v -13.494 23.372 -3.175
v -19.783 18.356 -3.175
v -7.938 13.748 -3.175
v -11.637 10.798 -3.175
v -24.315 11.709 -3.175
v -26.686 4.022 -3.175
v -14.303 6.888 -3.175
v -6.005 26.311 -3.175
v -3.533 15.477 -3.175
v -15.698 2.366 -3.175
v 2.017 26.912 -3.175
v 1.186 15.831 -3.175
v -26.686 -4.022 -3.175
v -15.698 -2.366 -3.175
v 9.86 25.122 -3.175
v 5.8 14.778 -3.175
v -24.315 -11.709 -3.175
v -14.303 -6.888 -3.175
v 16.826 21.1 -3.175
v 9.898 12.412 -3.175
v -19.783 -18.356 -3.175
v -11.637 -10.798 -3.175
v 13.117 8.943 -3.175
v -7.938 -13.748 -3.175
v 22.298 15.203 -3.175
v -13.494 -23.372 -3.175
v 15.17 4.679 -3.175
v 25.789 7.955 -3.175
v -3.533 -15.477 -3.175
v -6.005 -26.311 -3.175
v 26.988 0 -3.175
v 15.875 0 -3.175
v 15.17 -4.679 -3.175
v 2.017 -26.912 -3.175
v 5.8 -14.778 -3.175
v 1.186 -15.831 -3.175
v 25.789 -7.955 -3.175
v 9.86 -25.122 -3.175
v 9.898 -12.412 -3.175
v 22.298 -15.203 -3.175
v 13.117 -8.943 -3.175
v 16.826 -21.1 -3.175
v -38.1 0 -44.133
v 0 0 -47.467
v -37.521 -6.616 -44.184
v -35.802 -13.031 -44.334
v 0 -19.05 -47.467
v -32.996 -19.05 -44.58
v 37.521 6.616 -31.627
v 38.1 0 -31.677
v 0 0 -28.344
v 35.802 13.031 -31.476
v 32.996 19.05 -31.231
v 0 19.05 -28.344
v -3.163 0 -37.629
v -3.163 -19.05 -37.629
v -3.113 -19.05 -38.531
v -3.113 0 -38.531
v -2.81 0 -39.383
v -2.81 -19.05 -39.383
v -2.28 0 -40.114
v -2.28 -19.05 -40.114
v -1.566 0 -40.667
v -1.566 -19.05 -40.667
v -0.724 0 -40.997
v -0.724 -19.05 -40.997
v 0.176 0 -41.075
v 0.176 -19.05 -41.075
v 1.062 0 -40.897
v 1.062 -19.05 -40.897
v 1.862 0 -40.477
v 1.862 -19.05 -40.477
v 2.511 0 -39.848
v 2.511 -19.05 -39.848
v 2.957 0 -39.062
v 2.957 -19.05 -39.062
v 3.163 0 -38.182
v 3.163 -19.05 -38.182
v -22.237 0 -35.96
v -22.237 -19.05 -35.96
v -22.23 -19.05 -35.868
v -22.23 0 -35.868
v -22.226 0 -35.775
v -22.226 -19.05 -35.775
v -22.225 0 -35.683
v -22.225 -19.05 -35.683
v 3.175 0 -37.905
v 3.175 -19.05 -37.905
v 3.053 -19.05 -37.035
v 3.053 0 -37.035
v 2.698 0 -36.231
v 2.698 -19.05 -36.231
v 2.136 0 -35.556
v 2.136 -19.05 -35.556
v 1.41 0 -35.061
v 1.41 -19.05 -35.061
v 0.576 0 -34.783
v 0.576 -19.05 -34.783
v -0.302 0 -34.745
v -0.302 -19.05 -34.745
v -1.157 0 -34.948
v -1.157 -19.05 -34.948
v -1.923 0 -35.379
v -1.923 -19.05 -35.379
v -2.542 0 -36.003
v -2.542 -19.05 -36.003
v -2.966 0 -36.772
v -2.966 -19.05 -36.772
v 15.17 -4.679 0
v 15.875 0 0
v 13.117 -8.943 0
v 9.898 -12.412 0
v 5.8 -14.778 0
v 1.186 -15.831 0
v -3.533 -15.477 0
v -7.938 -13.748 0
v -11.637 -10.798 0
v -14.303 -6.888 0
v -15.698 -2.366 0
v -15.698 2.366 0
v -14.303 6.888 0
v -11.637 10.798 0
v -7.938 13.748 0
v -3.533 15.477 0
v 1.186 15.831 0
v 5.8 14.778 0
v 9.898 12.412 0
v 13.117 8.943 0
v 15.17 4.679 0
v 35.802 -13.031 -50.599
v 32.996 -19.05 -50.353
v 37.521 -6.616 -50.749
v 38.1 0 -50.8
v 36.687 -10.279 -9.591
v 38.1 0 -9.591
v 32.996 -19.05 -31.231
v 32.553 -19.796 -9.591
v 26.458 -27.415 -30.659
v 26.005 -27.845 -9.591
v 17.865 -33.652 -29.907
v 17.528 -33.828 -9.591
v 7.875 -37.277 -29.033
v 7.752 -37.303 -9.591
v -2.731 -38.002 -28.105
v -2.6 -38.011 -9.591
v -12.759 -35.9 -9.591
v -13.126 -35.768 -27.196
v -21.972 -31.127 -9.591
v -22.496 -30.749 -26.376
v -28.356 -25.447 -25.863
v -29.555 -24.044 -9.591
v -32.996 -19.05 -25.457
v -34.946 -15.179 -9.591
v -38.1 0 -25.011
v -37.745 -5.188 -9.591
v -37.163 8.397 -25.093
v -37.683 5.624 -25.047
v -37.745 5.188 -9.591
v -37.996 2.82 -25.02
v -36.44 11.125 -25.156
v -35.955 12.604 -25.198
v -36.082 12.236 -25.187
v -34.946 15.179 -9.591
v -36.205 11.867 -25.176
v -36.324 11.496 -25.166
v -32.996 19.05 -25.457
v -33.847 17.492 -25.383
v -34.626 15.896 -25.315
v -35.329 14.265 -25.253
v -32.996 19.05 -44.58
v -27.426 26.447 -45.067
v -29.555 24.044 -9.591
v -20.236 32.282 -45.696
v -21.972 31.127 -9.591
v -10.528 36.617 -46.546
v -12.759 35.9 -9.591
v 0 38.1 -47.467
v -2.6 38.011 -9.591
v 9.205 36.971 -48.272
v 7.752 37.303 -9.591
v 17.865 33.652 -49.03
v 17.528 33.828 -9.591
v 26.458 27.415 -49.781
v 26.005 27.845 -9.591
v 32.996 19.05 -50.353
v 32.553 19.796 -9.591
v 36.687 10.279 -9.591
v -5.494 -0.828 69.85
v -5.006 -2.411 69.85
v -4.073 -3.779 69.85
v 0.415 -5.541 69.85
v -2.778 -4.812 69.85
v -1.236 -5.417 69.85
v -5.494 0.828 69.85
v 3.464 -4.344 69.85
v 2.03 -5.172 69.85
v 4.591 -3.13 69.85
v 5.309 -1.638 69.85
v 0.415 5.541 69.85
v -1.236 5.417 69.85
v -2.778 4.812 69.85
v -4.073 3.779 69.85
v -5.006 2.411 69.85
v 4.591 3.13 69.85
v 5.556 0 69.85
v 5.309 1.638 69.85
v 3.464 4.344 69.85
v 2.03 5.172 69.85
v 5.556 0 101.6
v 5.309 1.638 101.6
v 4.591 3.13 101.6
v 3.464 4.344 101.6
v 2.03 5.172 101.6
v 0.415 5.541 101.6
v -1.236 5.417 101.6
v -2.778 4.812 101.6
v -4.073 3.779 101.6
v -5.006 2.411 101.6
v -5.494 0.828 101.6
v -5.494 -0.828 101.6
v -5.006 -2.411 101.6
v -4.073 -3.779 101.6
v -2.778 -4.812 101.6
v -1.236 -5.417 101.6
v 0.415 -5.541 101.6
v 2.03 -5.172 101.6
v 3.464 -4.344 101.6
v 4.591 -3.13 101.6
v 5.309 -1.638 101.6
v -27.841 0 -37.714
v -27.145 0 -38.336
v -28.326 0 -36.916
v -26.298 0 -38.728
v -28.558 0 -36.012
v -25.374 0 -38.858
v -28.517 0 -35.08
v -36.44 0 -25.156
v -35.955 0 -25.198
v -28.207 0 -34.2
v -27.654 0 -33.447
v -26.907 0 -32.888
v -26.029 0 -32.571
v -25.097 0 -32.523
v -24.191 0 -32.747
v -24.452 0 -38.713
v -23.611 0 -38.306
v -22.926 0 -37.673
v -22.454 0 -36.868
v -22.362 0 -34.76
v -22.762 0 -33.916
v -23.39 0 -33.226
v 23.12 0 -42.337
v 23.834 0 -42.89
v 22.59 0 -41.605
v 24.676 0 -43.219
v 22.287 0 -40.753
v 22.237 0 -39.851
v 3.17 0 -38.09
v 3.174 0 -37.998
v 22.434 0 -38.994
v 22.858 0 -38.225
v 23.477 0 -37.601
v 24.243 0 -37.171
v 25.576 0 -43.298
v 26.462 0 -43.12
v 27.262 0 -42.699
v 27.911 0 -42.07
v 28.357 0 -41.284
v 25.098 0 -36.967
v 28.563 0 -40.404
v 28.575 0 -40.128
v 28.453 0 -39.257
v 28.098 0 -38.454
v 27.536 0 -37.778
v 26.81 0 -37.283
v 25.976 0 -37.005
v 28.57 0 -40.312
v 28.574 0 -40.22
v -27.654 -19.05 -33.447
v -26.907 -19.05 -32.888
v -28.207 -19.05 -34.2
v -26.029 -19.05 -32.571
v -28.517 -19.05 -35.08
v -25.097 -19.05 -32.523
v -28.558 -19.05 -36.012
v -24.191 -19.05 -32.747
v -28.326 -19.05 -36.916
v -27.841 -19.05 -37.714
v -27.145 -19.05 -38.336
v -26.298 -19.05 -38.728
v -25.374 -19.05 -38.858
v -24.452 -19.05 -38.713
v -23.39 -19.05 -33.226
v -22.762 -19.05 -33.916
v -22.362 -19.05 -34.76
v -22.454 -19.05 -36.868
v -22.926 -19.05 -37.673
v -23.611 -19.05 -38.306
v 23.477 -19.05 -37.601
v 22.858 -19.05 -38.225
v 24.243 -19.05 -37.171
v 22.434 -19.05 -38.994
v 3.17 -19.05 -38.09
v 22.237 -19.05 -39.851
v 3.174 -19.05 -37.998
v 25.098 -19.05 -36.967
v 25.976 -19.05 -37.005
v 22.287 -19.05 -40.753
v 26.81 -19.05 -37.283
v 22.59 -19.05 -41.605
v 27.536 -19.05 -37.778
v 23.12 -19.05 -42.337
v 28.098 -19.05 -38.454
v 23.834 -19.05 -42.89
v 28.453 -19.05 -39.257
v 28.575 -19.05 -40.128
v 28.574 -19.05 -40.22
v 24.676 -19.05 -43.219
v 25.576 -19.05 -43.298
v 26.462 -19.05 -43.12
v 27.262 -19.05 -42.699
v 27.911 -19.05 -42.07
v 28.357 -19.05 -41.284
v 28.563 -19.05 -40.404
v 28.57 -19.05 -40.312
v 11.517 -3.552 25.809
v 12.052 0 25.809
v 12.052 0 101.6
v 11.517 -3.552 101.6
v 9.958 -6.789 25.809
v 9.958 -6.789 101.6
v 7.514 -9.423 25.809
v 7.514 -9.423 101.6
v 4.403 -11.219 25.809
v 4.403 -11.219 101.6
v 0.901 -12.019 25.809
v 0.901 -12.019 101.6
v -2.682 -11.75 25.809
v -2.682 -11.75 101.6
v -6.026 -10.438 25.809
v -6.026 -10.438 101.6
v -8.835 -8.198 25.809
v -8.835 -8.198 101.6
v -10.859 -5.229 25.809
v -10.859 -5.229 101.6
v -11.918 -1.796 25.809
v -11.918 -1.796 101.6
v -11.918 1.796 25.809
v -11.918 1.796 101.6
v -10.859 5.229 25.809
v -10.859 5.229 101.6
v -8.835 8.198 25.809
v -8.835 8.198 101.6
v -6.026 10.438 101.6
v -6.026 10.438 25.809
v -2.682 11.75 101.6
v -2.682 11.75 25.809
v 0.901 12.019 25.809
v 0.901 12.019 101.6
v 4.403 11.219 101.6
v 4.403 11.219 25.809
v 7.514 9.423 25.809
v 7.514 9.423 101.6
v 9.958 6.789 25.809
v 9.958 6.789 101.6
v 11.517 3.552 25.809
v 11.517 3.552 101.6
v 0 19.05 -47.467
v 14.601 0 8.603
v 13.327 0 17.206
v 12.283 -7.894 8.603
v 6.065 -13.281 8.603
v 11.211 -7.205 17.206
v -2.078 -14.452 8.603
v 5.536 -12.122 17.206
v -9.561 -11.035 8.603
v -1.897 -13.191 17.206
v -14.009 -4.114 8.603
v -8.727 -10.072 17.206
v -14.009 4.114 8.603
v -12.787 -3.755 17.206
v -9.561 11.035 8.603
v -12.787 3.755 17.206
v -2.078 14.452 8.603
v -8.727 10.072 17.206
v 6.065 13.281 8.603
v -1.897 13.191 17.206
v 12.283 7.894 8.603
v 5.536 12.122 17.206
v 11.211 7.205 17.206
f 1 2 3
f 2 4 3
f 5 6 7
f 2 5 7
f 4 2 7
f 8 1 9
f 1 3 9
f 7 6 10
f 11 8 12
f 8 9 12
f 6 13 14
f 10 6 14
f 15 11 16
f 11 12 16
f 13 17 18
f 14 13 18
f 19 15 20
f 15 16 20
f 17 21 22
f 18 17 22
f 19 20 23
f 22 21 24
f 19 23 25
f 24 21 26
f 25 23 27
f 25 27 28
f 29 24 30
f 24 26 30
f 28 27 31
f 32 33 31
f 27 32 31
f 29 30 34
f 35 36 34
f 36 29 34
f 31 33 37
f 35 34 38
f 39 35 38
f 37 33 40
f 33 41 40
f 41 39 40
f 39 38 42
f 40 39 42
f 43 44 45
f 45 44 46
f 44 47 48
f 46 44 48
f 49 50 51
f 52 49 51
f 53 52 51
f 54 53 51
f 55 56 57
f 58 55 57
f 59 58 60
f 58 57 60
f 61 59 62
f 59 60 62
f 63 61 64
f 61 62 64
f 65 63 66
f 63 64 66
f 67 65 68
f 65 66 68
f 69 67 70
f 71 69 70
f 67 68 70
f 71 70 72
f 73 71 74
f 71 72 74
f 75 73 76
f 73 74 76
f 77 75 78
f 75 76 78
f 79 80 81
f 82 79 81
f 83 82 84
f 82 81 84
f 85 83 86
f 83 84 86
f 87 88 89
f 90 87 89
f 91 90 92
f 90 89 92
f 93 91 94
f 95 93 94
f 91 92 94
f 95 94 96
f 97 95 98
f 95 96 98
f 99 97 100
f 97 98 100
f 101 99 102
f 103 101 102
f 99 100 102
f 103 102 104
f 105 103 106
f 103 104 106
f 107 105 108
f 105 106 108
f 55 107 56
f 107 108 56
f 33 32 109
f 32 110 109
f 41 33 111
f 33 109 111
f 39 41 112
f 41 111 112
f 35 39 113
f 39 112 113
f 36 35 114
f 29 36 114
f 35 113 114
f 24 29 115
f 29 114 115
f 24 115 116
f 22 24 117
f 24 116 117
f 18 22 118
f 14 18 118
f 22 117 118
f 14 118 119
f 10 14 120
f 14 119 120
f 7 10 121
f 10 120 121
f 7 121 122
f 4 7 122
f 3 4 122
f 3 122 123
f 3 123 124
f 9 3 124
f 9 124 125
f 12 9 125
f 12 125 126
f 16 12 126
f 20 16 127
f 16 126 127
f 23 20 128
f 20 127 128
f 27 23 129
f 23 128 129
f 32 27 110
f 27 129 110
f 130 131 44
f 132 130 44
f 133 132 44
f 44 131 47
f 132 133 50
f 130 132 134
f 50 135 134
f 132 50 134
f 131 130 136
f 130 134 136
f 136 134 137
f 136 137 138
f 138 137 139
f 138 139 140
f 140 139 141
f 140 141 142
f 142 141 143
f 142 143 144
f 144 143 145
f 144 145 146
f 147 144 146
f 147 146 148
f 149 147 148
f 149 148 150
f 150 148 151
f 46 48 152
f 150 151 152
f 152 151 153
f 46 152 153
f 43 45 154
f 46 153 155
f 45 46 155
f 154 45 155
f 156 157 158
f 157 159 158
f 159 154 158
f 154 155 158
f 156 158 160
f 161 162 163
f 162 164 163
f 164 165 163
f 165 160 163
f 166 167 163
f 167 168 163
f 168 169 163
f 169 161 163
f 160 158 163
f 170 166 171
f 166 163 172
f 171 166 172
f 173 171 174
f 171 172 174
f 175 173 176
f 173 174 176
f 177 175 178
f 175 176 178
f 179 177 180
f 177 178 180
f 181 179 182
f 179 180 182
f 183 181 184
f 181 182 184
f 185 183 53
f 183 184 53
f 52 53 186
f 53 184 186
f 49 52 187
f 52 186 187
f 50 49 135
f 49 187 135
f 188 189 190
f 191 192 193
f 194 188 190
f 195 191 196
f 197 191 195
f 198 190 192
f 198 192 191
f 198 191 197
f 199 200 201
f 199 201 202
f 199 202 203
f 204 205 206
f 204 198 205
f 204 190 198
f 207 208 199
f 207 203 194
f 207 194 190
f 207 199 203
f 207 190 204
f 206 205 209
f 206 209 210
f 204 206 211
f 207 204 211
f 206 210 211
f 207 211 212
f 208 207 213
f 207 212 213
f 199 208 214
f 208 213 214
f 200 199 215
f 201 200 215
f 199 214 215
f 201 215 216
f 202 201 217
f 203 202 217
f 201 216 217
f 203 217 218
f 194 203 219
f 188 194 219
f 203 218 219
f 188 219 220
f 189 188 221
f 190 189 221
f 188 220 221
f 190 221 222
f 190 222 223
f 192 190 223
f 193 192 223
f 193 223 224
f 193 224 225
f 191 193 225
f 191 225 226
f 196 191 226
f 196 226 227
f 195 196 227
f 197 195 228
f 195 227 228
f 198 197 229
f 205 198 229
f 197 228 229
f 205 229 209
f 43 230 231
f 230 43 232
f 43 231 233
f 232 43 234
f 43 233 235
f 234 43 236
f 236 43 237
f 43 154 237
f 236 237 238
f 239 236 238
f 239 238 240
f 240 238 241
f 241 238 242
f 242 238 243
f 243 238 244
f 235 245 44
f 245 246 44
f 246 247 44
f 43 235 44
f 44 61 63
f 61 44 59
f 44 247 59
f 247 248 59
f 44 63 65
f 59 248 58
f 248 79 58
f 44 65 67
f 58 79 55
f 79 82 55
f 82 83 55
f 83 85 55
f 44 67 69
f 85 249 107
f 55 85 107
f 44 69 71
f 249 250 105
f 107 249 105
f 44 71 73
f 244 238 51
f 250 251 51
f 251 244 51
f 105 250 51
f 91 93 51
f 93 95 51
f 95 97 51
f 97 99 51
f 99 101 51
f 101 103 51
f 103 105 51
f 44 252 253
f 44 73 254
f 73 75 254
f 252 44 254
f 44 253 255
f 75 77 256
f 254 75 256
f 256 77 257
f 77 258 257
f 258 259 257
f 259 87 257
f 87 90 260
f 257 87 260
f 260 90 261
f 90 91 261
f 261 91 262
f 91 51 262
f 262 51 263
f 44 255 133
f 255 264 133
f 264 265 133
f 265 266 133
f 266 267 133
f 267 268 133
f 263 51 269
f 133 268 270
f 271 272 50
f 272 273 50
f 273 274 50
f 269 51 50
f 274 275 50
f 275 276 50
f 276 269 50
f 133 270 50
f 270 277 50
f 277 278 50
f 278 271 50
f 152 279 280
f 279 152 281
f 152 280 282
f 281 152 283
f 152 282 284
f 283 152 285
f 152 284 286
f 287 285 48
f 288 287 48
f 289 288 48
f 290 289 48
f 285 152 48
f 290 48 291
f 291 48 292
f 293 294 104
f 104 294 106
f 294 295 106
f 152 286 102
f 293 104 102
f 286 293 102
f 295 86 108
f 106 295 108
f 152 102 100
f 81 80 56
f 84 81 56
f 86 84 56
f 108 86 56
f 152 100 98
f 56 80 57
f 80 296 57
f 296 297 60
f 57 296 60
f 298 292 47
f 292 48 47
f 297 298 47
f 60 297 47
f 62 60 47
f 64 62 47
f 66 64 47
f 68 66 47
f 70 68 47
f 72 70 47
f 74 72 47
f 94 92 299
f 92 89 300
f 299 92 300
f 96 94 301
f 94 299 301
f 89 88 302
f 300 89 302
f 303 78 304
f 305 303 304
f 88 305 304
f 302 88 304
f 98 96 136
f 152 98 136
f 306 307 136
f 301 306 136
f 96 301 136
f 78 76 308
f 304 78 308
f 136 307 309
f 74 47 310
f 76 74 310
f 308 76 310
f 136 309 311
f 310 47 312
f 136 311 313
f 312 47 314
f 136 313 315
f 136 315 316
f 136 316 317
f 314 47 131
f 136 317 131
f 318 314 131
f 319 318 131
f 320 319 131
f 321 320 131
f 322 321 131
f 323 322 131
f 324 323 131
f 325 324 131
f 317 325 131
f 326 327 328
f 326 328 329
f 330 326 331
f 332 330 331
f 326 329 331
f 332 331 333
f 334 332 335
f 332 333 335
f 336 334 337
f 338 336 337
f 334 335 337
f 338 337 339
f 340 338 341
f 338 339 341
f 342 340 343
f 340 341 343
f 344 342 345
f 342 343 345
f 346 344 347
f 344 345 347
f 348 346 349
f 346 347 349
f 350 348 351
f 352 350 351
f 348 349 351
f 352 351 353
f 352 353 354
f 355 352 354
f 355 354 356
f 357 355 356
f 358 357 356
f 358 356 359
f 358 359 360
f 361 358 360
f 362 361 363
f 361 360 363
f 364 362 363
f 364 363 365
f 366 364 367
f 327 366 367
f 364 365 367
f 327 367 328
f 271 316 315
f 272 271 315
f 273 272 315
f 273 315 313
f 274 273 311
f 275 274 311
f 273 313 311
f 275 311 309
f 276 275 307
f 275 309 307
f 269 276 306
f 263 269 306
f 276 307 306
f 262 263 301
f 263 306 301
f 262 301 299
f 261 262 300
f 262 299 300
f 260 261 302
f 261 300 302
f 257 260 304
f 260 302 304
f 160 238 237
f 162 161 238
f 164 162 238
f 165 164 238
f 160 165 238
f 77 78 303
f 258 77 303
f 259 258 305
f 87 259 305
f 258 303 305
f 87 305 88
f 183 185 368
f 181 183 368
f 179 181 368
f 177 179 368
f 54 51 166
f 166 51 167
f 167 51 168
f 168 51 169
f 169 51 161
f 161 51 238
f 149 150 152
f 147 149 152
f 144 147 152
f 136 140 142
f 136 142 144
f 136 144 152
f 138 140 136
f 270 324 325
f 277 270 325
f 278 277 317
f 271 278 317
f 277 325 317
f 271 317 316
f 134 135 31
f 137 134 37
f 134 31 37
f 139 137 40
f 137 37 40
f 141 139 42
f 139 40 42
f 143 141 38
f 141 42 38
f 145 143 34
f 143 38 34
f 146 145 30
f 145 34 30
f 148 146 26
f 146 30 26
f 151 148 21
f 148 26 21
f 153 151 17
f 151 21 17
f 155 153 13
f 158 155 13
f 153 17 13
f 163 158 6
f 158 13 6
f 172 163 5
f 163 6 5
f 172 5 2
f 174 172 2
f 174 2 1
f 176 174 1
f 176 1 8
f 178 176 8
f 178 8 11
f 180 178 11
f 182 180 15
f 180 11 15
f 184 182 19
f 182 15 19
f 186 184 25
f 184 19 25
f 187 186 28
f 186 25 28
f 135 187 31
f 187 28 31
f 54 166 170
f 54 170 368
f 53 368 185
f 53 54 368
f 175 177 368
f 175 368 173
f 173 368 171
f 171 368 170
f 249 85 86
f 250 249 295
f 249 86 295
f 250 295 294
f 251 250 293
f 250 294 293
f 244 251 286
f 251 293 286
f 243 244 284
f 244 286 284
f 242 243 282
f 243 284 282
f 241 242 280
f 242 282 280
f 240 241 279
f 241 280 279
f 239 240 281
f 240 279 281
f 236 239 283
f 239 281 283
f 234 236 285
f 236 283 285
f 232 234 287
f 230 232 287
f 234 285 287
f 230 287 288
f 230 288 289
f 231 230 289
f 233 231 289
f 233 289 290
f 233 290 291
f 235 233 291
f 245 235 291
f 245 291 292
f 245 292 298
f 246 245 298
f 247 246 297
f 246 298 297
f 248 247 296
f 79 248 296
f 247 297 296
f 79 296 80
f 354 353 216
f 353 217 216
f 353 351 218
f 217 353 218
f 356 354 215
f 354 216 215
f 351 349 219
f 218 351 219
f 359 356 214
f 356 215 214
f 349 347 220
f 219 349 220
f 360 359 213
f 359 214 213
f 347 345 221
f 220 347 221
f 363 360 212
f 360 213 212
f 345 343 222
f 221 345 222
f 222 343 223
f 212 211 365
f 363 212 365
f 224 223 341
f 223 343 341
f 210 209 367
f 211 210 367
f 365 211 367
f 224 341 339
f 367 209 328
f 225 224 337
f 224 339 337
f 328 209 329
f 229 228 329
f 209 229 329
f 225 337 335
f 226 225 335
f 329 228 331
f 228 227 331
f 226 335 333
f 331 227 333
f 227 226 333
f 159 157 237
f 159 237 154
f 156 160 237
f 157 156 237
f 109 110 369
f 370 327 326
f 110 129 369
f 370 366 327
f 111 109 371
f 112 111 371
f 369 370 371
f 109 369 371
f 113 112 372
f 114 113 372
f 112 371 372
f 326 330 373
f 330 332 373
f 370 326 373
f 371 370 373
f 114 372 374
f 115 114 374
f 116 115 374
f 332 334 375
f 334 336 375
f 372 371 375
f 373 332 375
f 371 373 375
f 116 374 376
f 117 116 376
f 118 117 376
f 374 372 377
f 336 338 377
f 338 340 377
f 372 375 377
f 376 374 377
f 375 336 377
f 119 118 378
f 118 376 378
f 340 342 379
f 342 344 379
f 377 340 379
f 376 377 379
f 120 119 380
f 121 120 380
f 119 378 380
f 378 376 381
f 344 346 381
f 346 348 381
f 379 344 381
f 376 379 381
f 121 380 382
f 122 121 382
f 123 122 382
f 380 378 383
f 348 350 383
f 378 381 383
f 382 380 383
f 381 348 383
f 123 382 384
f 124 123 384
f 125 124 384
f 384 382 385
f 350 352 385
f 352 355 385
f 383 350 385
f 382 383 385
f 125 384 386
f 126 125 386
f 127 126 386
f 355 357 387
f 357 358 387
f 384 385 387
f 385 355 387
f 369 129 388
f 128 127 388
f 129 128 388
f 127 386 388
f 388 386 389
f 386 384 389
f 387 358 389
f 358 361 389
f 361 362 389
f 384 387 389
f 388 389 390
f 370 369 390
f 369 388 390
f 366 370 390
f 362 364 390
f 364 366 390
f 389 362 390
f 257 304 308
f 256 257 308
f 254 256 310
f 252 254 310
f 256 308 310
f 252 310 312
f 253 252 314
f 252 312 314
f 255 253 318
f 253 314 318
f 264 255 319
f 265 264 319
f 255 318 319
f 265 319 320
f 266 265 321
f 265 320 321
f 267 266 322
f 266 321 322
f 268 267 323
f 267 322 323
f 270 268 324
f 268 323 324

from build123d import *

# Parameters (mm, degrees)
F0_W     = 9.525
F0_H     = 50.8
F2_DEPTH = 38.1
F3_DEPTH = 19.05
F5_DEPTH = 19.05
F7_DEPTH = 19.05
F8_R     = 5.55625
F9_DEPTH = 31.75


with BuildPart() as f1:
    # F0 (on Front) → F1 (revolve)
    with BuildSketch(Plane.XZ):
        with Locations((4.7625, 25.4)):
            Rectangle(F0_W, F0_H)
        Polygon((0, 101.6), (0, 50.8), (9.525, 50.8), (9.525, 0), (15.875, 0), (12.0523, 25.8093433608), (12.0523, 101.6), align=None)
        Polygon((38.1, -31.4561230436), (0, -24.7380650786), (0, -28.3439140145), (38.1, -31.6772320948), align=None)
        Polygon((38.1, -31.6772320948), (0, -28.3439140145), (0, -44.081942035), (38.1, -50.8), align=None)
        Polygon((38.1, -50.8), (0, -44.081942035), (0, -47.4666819197), align=None)
        Polygon((38.1, -50.8), (0, -47.4666819197), (0, -50.8), align=None)
        Polygon((9.525, 0), (0, 0), (0, -24.7380650786), (38.1, -31.4561230436), (38.1, -9.5908048664), (26.9875, -3.175), (15.875, -3.175), (15.875, 0), align=None)
    revolve(axis=Axis((0, 0, -25.4), (0, 0, -1)))

    # F0 (on Front) → F2 (cut, symmetric)
    with BuildSketch(Plane.XZ):
        Polygon((0, -50.8), (0, -47.4666819197), (-38.1, -44.1333638393), (-38.1, -50.8), align=None)
        Polygon((38.1, -50.8), (0, -47.4666819197), (0, -50.8), align=None)
    extrude(amount=F2_DEPTH, both=True, mode=Mode.SUBTRACT)

    # F0 (on Front) → F3 (cut)
    with BuildSketch(Plane.XZ):
        Polygon((38.1, -31.6772320948), (0, -28.3439140145), (0, -44.081942035), (38.1, -50.8), align=None)
        Polygon((0, -44.081942035), (0, -28.3439140145), (-35.954874027, -25.1982701386), (-36.9244921743, -30.6972479093), (-37.5167449121, -37.4667276786), align=None)
        Polygon((0, -47.4666819197), (0, -44.081942035), (-37.5167449121, -37.4667276786), (-38.1, -44.1333638393), align=None)
        Polygon((38.1, -50.8), (0, -44.081942035), (0, -47.4666819197), align=None)
        Polygon((-36.9244921743, -30.6972479093), (-35.954874027, -25.1982701386), (-36.4396831007, -25.1558548407), align=None)
        Polygon((-38.1, -37.36388407), (-36.9244921743, -30.6972479093), (-36.4396831007, -25.1558548407), (-38.1, -25.0105959341), align=None)
        Polygon((-38.1, -37.36388407), (-37.5167449121, -37.4667276786), (-36.9244921743, -30.6972479093), align=None)
        Polygon((-38.1, -44.1333638393), (-37.5167449121, -37.4667276786), (-38.1, -37.36388407), align=None)
    extrude(amount=-F3_DEPTH, mode=Mode.SUBTRACT)

    # F4 (on face) → F5 (cut)
    with BuildSketch(Plane(origin=(-4.1212514076, 0, -47.106119142), x_dir=(0.9961946981, 0, -0.0871557427), z_dir=(-0.0871557427, 0, -0.9961946981))):
        with BuildLine():
            Line((-28.9846116747, 19.05), (4.5792120209, 19.05))
            Line((4.5792120209, 19.05), (37.2585995116, 19.05))
            add(Edge.make_bspline(
                [(4.1369939185, 38.1), (26.2180643139, 38.1), (37.2585995116, 19.05)],
                knots=[1.5707963268, 1.5707963268, 1.5707963268, 2.6058232788, 2.6058232788, 2.6058232788], degree=2, weights=[1, 0.8070072037, 0.8683475024]))
            add(Edge.make_bspline(
                [(-28.9846116747, 19.05), (-17.944076477, 38.1), (4.1369939185, 38.1)],
                knots=[0.5357693748, 0.5357693748, 0.5357693748, 1.5707963268, 1.5707963268, 1.5707963268], degree=2, weights=[0.8683475024, 0.8070072037, 1]))
        make_face()
        with BuildLine():
            Line((-34.1085418919, 19.05), (-28.9846116747, 19.05))
            add(Edge.make_bspline(
                [(-28.9846116747, 19.05), (-17.944076477, 38.1), (4.1369939185, 38.1)],
                knots=[0.5357693748, 0.5357693748, 0.5357693748, 1.5707963268, 1.5707963268, 1.5707963268], degree=2, weights=[0.8683475024, 0.8070072037, 1]))
            Line((4.1369939185, 38.1), (-34.1085418919, 38.1365224015))
            Line((-34.1085418919, 38.1365224015), (-34.1085418919, 19.05))
        make_face()
    extrude(amount=-F5_DEPTH, mode=Mode.SUBTRACT)

    # F6 (on face) → F7 (cut)
    with BuildSketch(Plane.XZ.offset(19.05)):
        with BuildLine():
            Line((3.1629181664, -38.1820174503), (-3.1629181664, -37.6285784838))
            ThreePointArc((-3.1629181664, -37.6285784838), (-0.2767194832, -41.0682161335), (3.1629181664, -38.1820174503))
        make_face()
        with BuildLine():
            ThreePointArc((3.175, -37.9052979671), (0.1384915549, -34.7333198635), (-3.1629181664, -37.6285784838))
            Line((-3.1629181664, -37.6285784838), (3.1629181664, -38.1820174503))
            ThreePointArc((3.1629181664, -38.1820174503), (3.1719781035, -38.0437895219), (3.175, -37.9052979671))
        make_face()
        with BuildLine():
            ThreePointArc((-22.225, -35.6830859135), (-25.2615084451, -32.51110781), (-28.5629181664, -35.4063664303))
            Line((-28.5629181664, -35.4063664303), (-22.2370818336, -35.9598053967))
            ThreePointArc((-22.2370818336, -35.9598053967), (-22.2280218965, -35.8215774684), (-22.225, -35.6830859135))
        make_face()
        with BuildLine():
            Line((-22.2370818336, -35.9598053967), (-28.5629181664, -35.4063664303))
            ThreePointArc((-28.5629181664, -35.4063664303), (-25.6767194832, -38.8460040799), (-22.2370818336, -35.9598053967))
        make_face()
        with BuildLine():
            ThreePointArc((22.2370818336, -39.8507905374), (25.1232805168, -43.2904281871), (28.5629181664, -40.4042295038))
            Line((28.5629181664, -40.4042295038), (22.2370818336, -39.8507905374))
        make_face()
        with BuildLine():
            Line((22.2370818336, -39.8507905374), (28.5629181664, -40.4042295038))
            ThreePointArc((28.5629181664, -40.4042295038), (28.5719781035, -40.2660015755), (28.575, -40.1275100206))
            ThreePointArc((28.575, -40.1275100206), (25.5384915549, -36.9555319171), (22.2370818336, -39.8507905374))
        make_face()
    extrude(amount=-F7_DEPTH, mode=Mode.SUBTRACT)

    # F8 (on face) → F9 (cut)
    with BuildSketch(Plane.XY.offset(101.6)):
        Circle(F8_R)
    extrude(amount=-F9_DEPTH, mode=Mode.SUBTRACT)


solid = f1.part
